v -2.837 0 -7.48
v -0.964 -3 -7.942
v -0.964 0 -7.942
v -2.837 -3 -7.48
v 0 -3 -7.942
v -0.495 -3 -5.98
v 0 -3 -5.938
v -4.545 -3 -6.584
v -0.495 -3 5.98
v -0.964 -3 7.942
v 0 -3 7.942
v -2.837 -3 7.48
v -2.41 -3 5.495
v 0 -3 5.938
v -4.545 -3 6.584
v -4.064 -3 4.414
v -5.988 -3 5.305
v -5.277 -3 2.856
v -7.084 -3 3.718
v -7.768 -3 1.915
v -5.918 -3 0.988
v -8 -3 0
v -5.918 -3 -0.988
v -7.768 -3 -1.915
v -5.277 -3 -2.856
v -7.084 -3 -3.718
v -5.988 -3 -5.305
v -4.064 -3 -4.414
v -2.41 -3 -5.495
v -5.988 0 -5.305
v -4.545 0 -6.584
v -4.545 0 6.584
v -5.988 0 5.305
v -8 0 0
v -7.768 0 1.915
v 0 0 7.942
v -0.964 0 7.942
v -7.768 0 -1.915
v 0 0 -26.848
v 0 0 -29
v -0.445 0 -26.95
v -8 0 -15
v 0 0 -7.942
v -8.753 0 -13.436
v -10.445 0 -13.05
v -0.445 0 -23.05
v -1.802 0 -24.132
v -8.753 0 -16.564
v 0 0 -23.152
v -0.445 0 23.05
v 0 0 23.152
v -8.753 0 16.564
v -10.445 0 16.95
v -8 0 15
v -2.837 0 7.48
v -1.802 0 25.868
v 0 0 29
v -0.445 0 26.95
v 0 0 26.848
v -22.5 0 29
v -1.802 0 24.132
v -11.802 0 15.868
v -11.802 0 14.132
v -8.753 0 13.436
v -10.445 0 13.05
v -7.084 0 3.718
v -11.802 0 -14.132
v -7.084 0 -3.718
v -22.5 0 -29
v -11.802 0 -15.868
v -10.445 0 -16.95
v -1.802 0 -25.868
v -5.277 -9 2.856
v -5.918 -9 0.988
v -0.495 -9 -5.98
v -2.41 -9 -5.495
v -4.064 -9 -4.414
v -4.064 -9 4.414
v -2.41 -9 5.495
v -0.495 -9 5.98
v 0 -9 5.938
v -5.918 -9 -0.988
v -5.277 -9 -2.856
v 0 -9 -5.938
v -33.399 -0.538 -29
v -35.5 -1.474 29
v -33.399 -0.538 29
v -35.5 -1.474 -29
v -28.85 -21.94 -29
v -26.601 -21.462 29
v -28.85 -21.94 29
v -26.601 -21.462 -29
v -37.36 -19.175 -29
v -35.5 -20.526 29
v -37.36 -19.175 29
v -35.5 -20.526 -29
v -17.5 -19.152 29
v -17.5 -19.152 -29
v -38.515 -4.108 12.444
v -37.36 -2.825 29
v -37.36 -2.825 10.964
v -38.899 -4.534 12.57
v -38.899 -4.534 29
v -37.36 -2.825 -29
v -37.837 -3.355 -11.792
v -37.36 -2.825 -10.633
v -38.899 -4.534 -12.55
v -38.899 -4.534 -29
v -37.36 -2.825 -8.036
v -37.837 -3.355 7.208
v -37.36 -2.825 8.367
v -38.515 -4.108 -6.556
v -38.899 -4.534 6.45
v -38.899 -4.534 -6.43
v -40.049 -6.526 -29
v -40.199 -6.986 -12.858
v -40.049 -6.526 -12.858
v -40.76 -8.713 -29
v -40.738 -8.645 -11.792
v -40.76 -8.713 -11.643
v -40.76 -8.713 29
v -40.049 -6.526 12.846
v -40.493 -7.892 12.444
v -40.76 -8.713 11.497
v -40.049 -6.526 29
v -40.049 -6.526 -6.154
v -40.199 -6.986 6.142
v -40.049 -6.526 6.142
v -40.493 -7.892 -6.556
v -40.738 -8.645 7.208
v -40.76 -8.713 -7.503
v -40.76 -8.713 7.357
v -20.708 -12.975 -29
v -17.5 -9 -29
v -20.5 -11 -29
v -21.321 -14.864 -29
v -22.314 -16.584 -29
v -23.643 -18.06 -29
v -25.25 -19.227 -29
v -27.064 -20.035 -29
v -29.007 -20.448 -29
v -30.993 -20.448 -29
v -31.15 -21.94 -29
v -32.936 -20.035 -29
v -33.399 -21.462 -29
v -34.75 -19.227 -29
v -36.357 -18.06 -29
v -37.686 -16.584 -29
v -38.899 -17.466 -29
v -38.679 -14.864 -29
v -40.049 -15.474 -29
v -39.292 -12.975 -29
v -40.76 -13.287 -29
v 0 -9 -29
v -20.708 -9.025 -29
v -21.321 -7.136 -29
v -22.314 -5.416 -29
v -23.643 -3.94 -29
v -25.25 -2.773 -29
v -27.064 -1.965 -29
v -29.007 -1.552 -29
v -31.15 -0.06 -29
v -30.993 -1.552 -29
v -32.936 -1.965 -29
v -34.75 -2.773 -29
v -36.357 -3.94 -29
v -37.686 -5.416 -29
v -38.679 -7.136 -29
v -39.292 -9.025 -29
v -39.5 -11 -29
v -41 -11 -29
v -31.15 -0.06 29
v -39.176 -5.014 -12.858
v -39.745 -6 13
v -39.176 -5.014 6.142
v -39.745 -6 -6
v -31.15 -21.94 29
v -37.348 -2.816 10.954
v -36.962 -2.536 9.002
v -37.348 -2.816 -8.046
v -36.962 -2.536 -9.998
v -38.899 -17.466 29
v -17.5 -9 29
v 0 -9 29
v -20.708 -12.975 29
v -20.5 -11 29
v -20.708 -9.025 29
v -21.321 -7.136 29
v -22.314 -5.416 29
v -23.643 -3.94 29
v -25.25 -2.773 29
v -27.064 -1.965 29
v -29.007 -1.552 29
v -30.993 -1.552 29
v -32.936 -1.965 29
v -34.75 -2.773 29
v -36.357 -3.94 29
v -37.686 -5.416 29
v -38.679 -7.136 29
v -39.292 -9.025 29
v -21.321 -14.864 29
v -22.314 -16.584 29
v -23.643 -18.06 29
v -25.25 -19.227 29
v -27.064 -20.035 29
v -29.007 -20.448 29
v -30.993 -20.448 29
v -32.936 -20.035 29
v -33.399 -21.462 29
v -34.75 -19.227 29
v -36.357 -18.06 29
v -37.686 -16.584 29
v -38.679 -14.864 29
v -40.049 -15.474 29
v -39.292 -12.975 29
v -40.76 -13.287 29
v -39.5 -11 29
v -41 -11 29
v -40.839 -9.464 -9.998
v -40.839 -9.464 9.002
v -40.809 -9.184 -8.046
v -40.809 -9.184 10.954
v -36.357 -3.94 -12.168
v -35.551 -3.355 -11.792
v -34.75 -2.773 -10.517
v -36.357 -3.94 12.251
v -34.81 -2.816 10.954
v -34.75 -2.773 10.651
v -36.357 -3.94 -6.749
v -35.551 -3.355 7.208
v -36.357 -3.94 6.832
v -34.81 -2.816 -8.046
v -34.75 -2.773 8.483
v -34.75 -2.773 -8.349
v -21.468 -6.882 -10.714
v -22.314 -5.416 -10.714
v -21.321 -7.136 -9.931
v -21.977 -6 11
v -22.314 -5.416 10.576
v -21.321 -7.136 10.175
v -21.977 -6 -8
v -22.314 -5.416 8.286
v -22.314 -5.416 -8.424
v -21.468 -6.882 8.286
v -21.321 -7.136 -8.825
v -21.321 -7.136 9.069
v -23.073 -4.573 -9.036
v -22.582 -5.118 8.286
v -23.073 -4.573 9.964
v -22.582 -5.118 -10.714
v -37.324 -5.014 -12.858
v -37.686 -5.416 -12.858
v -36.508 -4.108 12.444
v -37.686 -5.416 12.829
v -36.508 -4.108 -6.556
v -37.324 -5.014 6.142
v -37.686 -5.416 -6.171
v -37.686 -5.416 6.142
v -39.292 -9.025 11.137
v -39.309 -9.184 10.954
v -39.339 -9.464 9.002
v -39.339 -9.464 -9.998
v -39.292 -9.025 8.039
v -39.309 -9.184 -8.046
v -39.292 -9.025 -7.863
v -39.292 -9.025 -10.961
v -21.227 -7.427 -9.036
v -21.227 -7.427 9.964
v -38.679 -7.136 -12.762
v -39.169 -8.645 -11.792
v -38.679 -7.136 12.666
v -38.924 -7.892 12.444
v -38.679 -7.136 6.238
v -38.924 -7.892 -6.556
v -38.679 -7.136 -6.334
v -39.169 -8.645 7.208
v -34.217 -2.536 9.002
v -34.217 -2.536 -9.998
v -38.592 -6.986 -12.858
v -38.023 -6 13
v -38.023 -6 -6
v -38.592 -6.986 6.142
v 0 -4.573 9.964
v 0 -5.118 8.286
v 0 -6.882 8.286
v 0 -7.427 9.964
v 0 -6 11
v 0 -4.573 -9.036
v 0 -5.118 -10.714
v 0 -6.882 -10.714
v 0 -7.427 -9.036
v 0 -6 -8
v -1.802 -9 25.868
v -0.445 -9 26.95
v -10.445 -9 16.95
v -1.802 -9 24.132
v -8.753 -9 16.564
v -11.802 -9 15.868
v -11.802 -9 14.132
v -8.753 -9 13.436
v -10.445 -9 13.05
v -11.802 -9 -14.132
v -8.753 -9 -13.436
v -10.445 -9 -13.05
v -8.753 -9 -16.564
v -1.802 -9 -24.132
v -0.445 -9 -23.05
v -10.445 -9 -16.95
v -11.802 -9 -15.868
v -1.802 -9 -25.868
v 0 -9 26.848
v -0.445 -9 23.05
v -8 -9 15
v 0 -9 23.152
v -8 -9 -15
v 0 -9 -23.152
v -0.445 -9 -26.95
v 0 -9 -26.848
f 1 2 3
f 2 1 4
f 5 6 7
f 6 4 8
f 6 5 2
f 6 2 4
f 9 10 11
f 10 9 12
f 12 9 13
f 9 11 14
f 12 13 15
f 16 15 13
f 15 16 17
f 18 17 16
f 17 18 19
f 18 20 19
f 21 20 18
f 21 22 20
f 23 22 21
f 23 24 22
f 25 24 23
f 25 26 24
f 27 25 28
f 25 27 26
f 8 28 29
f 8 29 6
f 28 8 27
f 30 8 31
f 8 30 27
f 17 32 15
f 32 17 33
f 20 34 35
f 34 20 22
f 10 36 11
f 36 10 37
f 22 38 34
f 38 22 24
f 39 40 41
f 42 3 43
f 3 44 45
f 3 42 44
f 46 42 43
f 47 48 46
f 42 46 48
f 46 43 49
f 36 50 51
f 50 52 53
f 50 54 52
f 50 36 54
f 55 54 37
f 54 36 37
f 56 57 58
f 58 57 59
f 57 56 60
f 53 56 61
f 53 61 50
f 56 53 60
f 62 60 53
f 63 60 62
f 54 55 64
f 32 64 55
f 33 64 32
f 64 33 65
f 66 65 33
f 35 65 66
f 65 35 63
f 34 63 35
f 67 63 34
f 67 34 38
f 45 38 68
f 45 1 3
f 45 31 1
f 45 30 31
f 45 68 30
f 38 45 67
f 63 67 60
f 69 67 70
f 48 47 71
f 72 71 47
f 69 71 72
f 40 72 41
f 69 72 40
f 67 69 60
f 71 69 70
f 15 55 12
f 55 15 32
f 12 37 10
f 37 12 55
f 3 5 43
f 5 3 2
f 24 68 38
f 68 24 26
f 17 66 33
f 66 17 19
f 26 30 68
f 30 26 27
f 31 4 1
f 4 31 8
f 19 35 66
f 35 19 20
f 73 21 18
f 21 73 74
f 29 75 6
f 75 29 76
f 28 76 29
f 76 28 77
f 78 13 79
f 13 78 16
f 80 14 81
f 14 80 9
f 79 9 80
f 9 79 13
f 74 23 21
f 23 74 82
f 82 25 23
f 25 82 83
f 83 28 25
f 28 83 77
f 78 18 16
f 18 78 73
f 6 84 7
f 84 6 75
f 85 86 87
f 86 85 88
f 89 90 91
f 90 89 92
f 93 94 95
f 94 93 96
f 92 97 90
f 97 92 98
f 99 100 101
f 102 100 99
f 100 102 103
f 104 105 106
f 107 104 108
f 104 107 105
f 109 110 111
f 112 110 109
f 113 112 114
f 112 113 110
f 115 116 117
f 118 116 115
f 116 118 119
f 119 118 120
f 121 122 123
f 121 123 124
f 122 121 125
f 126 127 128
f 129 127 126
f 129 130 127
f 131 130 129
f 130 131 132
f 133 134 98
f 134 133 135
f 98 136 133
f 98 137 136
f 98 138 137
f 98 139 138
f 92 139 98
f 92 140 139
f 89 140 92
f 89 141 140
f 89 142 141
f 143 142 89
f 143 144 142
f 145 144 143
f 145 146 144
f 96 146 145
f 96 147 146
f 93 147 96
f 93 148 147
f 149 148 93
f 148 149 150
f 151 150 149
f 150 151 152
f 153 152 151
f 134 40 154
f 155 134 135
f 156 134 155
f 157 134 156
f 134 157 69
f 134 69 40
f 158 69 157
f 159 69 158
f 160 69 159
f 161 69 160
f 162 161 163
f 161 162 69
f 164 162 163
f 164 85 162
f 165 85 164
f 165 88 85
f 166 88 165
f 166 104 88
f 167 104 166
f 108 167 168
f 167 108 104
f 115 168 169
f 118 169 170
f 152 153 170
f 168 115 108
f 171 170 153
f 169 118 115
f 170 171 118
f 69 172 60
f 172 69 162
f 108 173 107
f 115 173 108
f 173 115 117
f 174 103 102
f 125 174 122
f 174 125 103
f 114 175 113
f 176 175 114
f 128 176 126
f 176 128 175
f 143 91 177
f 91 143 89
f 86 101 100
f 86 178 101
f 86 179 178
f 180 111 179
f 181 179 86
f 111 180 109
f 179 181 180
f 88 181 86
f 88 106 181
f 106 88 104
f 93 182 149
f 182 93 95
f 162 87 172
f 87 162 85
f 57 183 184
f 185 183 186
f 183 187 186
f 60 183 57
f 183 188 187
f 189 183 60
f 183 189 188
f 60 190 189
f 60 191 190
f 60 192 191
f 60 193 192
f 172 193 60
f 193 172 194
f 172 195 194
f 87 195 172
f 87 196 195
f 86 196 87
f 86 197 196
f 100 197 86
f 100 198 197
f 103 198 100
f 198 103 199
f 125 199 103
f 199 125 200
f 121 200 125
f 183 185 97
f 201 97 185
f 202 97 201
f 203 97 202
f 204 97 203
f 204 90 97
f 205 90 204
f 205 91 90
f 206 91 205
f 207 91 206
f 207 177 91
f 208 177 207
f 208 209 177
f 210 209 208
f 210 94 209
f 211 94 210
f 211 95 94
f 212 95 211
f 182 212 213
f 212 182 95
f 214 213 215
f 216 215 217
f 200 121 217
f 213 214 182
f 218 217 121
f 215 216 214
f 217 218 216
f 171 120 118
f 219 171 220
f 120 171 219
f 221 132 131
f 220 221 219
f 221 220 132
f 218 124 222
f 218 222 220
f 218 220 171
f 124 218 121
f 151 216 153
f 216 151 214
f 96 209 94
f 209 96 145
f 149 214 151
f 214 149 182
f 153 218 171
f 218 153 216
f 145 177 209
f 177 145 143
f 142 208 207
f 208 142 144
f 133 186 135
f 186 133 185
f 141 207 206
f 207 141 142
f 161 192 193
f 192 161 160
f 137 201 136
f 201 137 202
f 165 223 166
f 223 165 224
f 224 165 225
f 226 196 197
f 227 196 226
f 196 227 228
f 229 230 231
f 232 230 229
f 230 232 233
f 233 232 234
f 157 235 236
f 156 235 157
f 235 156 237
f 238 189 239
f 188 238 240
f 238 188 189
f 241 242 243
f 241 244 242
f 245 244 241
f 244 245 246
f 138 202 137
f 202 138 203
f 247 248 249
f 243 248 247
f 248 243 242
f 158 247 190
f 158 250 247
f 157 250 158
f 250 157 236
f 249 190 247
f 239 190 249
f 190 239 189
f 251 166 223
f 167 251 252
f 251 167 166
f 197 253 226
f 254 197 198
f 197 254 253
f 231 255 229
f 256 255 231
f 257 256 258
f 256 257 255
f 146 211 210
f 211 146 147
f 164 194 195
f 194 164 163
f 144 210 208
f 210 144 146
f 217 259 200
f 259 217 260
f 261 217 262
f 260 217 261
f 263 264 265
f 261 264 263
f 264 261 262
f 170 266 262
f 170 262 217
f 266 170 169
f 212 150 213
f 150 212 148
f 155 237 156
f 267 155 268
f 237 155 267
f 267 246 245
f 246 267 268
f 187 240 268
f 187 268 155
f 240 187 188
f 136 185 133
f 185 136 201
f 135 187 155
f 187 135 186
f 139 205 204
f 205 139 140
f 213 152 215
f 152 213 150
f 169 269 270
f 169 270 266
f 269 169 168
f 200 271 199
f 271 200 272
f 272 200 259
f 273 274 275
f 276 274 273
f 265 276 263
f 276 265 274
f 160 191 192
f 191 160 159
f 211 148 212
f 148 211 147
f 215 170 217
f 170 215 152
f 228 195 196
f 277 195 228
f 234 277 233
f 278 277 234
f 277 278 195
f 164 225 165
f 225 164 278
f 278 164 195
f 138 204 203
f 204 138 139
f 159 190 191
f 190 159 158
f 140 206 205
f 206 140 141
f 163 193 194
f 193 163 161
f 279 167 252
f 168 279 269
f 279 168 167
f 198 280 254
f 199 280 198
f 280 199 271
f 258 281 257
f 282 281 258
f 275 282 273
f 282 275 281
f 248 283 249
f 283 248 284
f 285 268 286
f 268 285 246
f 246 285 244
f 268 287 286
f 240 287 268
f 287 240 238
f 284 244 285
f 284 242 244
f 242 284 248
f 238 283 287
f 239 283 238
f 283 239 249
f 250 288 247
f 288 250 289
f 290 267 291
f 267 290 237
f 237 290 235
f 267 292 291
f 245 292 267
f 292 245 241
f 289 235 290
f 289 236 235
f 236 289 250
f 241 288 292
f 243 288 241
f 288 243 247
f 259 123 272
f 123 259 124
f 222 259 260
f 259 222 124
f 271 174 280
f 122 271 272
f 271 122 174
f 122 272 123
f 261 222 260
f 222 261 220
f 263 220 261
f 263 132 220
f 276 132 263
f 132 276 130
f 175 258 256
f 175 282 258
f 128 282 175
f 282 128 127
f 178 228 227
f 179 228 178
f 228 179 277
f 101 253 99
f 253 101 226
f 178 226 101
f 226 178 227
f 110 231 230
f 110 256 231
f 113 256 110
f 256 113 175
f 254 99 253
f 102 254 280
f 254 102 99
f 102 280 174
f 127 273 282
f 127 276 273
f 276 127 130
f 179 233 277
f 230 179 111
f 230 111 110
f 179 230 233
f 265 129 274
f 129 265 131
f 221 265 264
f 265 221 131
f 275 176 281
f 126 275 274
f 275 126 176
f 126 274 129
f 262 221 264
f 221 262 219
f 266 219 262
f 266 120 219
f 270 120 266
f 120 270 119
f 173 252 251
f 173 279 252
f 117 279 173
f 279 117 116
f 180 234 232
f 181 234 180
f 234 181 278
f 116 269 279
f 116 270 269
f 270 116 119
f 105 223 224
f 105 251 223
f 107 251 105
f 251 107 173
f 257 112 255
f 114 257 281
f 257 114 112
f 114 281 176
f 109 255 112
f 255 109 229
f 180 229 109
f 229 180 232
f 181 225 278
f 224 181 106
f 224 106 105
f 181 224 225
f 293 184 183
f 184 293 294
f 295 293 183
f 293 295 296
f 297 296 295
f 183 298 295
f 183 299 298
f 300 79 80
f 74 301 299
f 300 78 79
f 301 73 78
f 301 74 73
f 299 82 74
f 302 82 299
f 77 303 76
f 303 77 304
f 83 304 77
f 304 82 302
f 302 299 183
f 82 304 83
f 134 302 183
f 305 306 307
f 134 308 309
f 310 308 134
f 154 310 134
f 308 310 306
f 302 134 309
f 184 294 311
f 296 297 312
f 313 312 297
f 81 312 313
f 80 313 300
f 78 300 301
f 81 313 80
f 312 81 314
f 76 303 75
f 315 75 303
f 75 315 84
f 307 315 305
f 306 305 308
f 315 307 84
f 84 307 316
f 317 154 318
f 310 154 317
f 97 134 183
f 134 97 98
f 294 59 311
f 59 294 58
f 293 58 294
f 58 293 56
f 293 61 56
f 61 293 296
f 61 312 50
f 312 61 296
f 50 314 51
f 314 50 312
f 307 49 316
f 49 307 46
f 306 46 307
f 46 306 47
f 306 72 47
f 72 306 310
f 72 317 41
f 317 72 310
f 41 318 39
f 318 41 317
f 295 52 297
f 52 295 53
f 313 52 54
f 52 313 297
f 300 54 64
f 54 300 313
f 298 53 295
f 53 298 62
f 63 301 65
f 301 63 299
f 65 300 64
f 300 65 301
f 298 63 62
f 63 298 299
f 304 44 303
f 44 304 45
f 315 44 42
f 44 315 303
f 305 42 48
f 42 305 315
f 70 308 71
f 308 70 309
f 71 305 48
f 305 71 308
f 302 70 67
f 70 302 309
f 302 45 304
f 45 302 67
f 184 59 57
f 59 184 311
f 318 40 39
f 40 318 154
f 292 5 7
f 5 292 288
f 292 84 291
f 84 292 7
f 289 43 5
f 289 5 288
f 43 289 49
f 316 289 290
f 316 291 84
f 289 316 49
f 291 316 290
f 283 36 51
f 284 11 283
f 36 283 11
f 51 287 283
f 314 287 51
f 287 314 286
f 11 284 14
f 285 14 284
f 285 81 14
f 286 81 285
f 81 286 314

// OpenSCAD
// file: veriables.scad
aluminum_width			= 20;
wall_thickness			= 3;
depth						= 20;
smooth_rod				= 10;
long_bearing_od			= 19;
long_bearing_length		= 29;
bearing_outer			= 22;
bearing_inner			= 8;
bearing_thick				= 7;
screw_diamiter			= 4;
motor_width				= 42.5;
motor_screw_space		= 31;

hotend_gap				= 6;
hotend_gap_dia			= 12;
hotend_top				= 3;
hotend_top_dia			= 16;

x_rod_spacing			= 60;

aluminum_plate_thick	= 3;
// main file
include <veriables.scad>;

module hotend(){
	//top
	translate([0,0,-hotend_top/2]) cylinder(d=hotend_top_dia, h=hotend_top,center=true);
	//bottom
	cylinder(d=hotend_gap_dia, h=hotend_gap+10, center=true);
}

module basics(){
	hull(){
		translate([0,0,(hotend_gap+hotend_top)/2]) cube([45,long_bearing_length*2,hotend_gap+hotend_top], center=true);
		rotate([90,0,0]) translate([-x_rod_spacing/2,(long_bearing_od+wall_thickness)/2,0]) cylinder(d=long_bearing_od+wall_thickness, h=long_bearing_length*2, center=true);
	}
}

rotate([90,0,0]) intersection(){
	difference(){
		basics();
		translate([0,0,(hotend_gap+hotend_top)/3]) hotend();
		rotate([90,0,0]) translate([-x_rod_spacing/2,(long_bearing_od+wall_thickness)/2,0]) cylinder(d=long_bearing_od, h=long_bearing_length*2+5, center=true);
		translate([0,long_bearing_od/2,6]) rotate([90,0,90]) cylinder(d=3, h= 100, center=true);
		translate([0,-long_bearing_od/2,6]) rotate([90,0,90]) cylinder(d=3, h= 100, center=true);
		translate([-38,long_bearing_od/2,6]) rotate([90,0,90]) cylinder(d=7, h= 10, center=true);
		translate([-38,-long_bearing_od/2,6]) rotate([90,0,90]) cylinder(d=7, h= 10, center=true);
		translate([0,0,(hotend_gap+hotend_top)/2+hotend_gap+hotend_top+5]) cube([35,long_bearing_length*2,hotend_gap+hotend_top+10], center=true);
		translate([0,25,0]) cylinder(d=4, h=50, center=true);
		translate([0,-25,0]) cylinder(d=4, h=50, center=true);
		translate([-10,15,0]) cylinder(d=4, h=50, center=true);
		translate([-10,-15,0]) cylinder(d=4, h=50, center=true);
	}
		translate([-100,-50,0]) cube([100,100,100]);
}
